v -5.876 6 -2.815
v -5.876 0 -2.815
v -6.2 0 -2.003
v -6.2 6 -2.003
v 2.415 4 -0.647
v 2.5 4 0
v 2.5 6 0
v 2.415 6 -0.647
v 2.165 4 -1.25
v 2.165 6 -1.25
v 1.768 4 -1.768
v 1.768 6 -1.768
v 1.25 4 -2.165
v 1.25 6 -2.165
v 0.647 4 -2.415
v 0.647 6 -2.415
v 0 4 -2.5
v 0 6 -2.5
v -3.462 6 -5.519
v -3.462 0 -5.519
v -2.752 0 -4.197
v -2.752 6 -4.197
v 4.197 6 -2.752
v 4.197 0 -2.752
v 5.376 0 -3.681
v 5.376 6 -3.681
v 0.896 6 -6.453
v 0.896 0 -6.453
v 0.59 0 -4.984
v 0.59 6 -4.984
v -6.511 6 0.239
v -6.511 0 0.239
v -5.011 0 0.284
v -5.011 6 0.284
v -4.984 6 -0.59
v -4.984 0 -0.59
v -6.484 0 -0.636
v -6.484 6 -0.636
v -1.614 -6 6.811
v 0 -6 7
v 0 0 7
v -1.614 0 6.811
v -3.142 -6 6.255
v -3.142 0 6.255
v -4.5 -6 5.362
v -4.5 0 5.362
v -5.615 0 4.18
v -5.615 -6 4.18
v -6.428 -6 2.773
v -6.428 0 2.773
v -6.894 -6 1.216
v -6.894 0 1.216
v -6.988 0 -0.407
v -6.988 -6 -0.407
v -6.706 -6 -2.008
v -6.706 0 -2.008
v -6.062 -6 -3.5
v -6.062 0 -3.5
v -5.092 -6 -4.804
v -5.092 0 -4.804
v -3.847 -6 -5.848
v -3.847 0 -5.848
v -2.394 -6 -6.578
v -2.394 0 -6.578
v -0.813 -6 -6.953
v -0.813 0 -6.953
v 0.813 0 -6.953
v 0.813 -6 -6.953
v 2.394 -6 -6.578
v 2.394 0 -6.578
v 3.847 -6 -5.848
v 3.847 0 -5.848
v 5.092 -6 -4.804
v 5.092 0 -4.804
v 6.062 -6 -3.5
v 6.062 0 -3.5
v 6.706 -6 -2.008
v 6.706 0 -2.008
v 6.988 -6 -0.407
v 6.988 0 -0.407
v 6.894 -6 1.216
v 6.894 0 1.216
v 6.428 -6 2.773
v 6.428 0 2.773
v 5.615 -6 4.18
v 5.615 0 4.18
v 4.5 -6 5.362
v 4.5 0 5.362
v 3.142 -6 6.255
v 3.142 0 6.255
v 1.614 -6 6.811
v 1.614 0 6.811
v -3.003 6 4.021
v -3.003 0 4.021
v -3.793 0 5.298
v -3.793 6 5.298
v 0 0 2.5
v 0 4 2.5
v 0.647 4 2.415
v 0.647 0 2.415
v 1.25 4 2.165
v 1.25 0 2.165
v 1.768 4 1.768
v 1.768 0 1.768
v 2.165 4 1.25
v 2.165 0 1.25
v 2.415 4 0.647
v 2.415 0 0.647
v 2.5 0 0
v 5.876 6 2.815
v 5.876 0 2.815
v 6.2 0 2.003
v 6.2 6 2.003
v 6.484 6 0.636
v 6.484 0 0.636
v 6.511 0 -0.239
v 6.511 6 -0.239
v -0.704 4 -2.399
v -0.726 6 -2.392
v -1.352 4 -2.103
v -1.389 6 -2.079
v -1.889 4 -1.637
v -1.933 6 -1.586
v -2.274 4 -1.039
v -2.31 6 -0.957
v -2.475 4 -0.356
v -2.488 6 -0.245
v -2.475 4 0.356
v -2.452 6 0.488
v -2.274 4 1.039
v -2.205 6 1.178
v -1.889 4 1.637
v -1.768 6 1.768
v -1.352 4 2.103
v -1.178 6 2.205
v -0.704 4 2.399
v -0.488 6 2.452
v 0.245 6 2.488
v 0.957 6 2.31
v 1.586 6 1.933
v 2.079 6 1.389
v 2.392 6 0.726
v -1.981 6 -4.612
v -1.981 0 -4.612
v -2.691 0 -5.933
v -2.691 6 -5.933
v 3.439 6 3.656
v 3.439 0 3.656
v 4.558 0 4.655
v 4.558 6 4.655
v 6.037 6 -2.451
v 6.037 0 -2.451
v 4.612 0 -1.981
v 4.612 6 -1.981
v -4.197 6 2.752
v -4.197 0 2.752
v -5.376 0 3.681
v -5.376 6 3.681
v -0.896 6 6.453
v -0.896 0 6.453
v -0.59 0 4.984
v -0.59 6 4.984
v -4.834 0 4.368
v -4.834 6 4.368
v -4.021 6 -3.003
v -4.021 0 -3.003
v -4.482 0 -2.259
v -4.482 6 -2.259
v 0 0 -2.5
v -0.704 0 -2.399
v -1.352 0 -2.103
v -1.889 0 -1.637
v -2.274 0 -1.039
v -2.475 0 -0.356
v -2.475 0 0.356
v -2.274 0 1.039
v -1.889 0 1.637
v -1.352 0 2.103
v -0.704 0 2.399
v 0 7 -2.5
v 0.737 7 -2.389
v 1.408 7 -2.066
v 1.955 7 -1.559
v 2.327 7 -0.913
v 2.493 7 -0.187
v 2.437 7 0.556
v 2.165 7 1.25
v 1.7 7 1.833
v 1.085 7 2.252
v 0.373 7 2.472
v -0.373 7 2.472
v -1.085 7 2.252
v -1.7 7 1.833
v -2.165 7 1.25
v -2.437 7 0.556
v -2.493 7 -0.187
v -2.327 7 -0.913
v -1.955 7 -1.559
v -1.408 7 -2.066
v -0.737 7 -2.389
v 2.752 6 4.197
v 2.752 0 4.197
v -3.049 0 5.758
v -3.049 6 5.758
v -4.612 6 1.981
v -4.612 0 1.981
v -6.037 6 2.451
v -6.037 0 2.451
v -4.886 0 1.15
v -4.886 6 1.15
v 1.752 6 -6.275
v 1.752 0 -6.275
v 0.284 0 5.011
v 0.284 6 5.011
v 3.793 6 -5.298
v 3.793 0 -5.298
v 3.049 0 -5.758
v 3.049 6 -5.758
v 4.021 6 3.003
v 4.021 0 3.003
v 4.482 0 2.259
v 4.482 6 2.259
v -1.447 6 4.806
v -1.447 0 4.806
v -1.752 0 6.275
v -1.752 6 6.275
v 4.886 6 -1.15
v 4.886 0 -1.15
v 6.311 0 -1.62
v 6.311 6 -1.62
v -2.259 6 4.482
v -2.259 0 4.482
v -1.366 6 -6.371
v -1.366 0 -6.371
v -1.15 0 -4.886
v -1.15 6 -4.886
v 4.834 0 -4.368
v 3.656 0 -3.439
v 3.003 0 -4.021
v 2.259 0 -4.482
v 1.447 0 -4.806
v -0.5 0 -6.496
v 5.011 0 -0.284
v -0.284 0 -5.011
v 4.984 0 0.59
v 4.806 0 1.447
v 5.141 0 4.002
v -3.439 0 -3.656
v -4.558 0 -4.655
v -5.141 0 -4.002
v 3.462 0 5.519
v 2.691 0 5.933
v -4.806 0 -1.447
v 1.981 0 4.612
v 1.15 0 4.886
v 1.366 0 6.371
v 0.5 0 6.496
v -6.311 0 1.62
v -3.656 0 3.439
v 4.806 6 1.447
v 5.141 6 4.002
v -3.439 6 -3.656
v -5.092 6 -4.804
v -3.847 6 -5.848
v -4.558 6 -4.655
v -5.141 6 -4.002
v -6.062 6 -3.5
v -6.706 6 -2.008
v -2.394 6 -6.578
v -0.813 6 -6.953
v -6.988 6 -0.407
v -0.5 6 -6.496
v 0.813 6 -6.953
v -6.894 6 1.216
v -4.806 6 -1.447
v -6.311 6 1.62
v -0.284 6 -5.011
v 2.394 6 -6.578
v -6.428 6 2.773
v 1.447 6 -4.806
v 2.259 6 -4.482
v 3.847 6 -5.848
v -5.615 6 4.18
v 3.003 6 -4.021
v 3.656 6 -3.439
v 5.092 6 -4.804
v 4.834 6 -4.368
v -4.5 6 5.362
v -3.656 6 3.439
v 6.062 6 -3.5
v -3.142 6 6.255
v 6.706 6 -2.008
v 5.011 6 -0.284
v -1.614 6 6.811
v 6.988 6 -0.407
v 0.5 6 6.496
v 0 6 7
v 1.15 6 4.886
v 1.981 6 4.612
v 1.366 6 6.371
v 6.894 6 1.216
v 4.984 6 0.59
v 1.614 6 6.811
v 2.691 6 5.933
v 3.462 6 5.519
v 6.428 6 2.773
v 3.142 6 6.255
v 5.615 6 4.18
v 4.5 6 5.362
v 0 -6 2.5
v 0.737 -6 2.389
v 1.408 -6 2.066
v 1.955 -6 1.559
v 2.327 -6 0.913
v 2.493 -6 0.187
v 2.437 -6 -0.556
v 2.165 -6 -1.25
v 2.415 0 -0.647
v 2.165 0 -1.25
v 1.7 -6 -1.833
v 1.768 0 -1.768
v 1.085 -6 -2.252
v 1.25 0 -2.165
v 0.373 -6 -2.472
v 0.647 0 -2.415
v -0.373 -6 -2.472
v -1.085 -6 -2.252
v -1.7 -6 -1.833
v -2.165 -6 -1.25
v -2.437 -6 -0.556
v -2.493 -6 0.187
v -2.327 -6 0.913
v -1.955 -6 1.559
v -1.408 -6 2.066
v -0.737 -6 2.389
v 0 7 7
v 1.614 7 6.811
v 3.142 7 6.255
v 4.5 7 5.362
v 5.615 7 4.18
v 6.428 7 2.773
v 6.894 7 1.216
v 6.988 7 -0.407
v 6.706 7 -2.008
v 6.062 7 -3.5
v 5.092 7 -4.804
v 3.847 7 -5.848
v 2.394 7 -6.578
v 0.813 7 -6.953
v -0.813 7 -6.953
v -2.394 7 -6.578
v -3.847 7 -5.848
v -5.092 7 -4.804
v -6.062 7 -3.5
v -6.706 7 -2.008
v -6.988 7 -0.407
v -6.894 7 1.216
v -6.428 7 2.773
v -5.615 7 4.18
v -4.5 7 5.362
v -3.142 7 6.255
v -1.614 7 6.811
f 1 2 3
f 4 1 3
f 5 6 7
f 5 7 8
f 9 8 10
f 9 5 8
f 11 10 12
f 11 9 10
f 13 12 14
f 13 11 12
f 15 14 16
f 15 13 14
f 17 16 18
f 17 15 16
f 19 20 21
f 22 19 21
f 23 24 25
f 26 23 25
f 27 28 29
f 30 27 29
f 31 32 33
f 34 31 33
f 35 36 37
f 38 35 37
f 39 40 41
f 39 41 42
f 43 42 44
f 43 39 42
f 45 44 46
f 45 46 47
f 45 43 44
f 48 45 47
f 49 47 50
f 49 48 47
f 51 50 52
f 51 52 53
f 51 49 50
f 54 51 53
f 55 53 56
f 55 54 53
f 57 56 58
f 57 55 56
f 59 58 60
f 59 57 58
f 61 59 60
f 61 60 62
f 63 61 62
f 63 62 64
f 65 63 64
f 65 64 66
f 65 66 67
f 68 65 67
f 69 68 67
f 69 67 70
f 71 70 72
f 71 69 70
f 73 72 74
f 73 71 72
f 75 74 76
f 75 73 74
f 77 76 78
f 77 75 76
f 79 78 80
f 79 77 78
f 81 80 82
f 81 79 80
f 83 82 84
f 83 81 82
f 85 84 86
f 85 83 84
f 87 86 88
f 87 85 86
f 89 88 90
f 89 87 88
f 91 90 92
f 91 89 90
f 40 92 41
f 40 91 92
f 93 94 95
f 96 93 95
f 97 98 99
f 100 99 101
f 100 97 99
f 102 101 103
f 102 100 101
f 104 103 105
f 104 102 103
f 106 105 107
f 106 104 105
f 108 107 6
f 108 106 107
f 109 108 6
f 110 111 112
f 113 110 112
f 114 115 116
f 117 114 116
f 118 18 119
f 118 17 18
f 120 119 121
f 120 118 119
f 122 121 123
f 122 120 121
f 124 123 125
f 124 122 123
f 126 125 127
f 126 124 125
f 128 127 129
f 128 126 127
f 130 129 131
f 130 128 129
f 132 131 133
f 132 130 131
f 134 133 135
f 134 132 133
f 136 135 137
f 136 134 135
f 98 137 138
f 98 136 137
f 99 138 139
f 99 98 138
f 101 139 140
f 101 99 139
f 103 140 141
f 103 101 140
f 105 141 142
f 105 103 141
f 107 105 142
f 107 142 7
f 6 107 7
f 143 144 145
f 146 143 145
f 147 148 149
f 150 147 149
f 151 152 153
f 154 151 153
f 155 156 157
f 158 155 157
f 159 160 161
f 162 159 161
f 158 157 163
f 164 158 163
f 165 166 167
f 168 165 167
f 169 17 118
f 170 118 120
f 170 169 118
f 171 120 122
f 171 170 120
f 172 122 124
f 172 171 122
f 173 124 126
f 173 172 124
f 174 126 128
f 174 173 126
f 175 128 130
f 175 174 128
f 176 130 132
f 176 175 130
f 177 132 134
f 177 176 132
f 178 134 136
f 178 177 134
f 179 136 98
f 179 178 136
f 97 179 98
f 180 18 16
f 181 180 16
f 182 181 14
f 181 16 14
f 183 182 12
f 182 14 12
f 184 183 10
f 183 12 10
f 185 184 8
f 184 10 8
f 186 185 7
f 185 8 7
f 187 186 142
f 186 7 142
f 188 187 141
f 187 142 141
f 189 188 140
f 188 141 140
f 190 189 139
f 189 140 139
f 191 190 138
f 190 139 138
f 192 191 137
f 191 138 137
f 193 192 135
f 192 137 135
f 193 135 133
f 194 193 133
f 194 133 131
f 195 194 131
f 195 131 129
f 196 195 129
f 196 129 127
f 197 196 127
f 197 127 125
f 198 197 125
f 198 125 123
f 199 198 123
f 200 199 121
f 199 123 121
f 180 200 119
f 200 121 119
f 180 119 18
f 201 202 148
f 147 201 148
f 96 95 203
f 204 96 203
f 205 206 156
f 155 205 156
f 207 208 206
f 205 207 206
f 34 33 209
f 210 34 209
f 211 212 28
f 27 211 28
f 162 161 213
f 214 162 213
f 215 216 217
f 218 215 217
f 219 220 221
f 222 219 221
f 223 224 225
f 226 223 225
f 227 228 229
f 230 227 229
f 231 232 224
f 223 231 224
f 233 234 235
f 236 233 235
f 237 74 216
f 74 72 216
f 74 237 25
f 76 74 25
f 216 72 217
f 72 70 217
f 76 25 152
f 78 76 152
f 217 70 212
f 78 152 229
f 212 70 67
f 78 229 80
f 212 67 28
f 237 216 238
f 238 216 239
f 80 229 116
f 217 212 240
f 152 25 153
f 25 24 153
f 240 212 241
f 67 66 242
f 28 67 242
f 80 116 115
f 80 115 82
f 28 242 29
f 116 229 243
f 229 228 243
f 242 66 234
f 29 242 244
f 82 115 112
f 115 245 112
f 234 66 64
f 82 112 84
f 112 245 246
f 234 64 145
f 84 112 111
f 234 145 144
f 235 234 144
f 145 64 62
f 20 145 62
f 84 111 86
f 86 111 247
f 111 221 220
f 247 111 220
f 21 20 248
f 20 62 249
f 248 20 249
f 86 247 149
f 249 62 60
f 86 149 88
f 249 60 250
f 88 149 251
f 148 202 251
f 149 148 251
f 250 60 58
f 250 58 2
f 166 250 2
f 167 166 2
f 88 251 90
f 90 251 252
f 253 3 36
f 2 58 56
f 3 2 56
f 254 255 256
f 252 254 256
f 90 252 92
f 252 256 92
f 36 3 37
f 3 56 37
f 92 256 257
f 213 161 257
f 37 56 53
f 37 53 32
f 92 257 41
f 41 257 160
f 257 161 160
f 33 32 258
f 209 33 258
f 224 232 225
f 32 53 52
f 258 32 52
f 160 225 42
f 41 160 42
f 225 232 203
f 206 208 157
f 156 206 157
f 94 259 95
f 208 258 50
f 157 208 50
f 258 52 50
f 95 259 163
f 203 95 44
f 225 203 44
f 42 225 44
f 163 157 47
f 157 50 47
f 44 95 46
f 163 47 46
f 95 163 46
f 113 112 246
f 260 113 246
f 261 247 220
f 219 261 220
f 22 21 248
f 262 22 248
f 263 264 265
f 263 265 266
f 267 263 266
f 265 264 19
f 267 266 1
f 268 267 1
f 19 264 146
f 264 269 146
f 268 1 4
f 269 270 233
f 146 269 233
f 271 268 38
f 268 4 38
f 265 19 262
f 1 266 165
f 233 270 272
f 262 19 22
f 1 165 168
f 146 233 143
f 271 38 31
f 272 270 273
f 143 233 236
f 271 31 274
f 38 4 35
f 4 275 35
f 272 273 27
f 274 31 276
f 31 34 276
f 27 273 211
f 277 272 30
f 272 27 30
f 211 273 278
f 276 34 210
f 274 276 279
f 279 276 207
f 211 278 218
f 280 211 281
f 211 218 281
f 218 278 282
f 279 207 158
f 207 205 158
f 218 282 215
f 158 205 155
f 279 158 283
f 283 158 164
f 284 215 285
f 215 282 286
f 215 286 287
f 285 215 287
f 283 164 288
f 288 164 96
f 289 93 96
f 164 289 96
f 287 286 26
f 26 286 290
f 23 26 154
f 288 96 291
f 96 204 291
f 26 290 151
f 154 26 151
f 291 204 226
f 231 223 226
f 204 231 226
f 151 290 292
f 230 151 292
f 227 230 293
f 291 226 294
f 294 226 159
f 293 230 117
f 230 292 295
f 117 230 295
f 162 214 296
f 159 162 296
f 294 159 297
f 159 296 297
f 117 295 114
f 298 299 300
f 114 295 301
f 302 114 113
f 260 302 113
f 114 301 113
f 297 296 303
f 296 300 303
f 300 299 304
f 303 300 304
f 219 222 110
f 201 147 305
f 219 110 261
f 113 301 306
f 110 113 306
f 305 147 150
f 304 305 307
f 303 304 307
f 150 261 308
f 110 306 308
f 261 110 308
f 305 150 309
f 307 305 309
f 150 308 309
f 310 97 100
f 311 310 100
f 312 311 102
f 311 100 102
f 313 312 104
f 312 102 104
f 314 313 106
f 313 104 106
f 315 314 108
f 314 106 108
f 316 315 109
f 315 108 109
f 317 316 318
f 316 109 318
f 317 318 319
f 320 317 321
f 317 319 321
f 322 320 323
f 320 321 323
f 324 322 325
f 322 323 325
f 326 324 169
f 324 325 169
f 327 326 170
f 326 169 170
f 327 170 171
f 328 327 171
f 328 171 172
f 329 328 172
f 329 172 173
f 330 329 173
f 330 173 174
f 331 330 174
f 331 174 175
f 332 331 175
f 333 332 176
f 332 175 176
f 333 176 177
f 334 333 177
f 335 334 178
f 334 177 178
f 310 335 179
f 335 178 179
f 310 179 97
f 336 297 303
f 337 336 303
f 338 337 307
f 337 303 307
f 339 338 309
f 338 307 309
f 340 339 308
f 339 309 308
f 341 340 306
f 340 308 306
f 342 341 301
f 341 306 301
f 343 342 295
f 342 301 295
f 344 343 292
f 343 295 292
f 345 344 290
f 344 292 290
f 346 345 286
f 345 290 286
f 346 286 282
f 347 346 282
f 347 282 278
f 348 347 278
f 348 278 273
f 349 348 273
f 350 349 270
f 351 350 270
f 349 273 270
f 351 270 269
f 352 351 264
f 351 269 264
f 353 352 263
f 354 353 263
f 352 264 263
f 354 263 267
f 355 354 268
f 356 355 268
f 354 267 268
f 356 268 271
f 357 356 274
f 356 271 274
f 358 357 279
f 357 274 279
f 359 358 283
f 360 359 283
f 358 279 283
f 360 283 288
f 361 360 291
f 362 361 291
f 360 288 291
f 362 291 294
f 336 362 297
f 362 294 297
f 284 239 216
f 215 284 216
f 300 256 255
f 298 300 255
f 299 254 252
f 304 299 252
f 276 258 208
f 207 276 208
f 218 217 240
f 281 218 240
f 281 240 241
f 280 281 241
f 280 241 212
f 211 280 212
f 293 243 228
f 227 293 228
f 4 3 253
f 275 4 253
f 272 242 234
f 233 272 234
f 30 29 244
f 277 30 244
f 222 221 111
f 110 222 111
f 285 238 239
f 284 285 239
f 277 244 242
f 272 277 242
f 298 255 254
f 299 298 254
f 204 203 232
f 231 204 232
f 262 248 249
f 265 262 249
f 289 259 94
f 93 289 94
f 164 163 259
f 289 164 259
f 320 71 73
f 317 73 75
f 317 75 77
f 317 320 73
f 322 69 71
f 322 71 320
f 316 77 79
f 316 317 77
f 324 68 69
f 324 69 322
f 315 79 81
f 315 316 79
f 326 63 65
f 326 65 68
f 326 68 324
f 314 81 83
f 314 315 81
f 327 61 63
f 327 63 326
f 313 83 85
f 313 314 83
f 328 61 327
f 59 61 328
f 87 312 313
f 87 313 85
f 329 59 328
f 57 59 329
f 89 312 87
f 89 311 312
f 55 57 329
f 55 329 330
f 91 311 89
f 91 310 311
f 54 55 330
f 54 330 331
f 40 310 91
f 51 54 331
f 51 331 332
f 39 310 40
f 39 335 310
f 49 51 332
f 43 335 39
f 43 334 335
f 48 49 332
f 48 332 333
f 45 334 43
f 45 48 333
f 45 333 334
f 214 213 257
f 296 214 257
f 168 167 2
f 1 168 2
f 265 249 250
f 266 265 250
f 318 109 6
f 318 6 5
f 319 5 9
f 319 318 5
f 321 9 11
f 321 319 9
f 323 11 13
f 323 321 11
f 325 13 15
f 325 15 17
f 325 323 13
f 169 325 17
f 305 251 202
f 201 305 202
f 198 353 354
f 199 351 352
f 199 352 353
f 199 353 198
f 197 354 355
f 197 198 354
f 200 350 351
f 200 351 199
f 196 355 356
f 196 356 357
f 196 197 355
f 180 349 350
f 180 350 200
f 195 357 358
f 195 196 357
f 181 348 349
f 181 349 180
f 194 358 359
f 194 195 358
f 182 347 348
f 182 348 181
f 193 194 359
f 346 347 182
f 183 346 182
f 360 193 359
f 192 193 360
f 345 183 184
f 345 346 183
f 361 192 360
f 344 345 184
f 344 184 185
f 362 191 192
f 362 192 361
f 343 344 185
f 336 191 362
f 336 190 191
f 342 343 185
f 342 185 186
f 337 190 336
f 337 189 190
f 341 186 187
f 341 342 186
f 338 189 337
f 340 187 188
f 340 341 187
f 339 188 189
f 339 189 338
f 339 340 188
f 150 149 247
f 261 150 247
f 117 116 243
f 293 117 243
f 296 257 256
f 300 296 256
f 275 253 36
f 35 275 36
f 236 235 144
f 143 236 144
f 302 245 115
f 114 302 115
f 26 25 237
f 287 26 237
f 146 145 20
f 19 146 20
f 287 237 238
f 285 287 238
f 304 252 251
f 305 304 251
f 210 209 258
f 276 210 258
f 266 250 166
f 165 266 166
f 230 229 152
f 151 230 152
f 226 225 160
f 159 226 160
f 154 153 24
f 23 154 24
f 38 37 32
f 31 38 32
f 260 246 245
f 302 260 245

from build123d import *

# Parameters (mm, degrees)
ESTRUSIONE_ESTRUSIONE1_OUTLINE_R = 2.5
ESTRUSIONE_ESTRUSIONE1_DEPTH     = 6
SCHIZZO2_R                       = 7
ESTRUSIONE_ESTRUSIONE2_DEPTH     = 1
FORI_FILETTATI_5_0MM1_D          = 5
ESTRUSIONE_ESTRUSIONE3_START     = 6
SCHIZZO4_R                       = 7
ESTRUSIONE_ESTRUSIONE3_DEPTH     = 6
FORI_FILETTATI_5_0MM2_D          = 5
FORI_FILETTATI_5_0MM2_DEPTH      = 10
FORI_FILETTATI_5_0MM2_TIP        = 1.502151548


# Read off the part's stored shape, not the designer's step: Estrusione-Estrusione1
with BuildPart() as part:
    # Estrusione-Estrusione1 outline → Estrusione-Estrusione1 (new body)
    with BuildSketch(Plane(origin=(0, 0, 0), x_dir=(1, 0, 0), z_dir=(0, 1, 0))):
        Polygon((-4.558413324, 4.655107649), (-5.141001385, 4.002407278), (-4.021493725, 3.00315582), (-4.481890734, 2.259206078), (-5.875647949, 2.815301129), (-6.199864976, 2.002706553), (-4.806107761, 1.446611503), (-4.984293637, 0.590062369), (-6.484192715, 0.635927742), (-6.51093335, -0.238550138), (-5.011034272, -0.284415511), (-4.885517166, -1.15025157), (-6.310648144, -1.620147915), (-6.036687071, -2.451034162), (-4.611556094, -1.981137817), (-4.197475223, -2.751828193), (-5.375946271, -3.680809823), (-4.83432724, -4.367887293), (-3.655856192, -3.438905663), (-3.00315582, -4.021493725), (-3.792825937, -5.297511743), (-3.048876196, -5.757908753), (-2.259206078, -4.481890734), (-1.446611503, -4.806107761), (-1.75223482, -6.275255564), (-0.895685686, -6.45344144), (-0.590062369, -4.984293637), (0.284415511, -5.011034272), (0.499701678, -6.496110952), (1.365537736, -6.370593846), (1.15025157, -4.885517166), (1.981137817, -4.611556094), (2.691366778, -5.933439486), (3.462057155, -5.519358615), (2.751828193, -4.197475223), (3.438905663, -3.655856192), (4.558413324, -4.655107649), (5.141001385, -4.002407278), (4.021493725, -3.00315582), (4.481890734, -2.259206078), (5.875647949, -2.815301129), (6.199864976, -2.002706553), (4.806107761, -1.446611503), (4.984293637, -0.590062369), (6.484192715, -0.635927742), (6.51093335, 0.238550138), (5.011034272, 0.284415511), (4.885517166, 1.15025157), (6.310648144, 1.620147915), (6.036687071, 2.451034162), (4.611556094, 1.981137817), (4.197475223, 2.751828193), (5.375946271, 3.680809823), (4.83432724, 4.367887293), (3.655856192, 3.438905663), (3.00315582, 4.021493725), (3.792825937, 5.297511743), (3.048876196, 5.757908753), (2.259206078, 4.481890734), (1.446611503, 4.806107761), (1.75223482, 6.275255564), (0.895685686, 6.45344144), (0.590062369, 4.984293637), (-0.284415511, 5.011034272), (-0.499701678, 6.496110952), (-1.365537736, 6.370593846), (-1.15025157, 4.885517166), (-1.981137817, 4.611556094), (-2.691366778, 5.933439486), (-3.462057155, 5.519358615), (-2.751828193, 4.197475223), (-3.438905663, 3.655856192), align=None)
        Circle(ESTRUSIONE_ESTRUSIONE1_OUTLINE_R, mode=Mode.SUBTRACT)
    extrude(amount=ESTRUSIONE_ESTRUSIONE1_DEPTH)

    # Schizzo2 → Estrusione-Estrusione2 (add)
    with BuildSketch(Plane(origin=(0, 6, 0), x_dir=(1, 0, 0), z_dir=(0, 1, 0))):
        with Locations(Location((0, 0, 0), (0, 0, 270))):
            Circle(SCHIZZO2_R)
    extrude(amount=ESTRUSIONE_ESTRUSIONE2_DEPTH)

    # Fori filettati Ø5.0mm1 (through all)
    with Locations(Plane.ZX.offset(7)):
        with Locations((0, 0)):
            Hole(FORI_FILETTATI_5_0MM1_D / 2)

    # Schizzo4 → Estrusione-Estrusione3 (add)
    with BuildSketch(Plane.XZ.offset(ESTRUSIONE_ESTRUSIONE3_START)):
        with Locations(Location((0, 0, 0), (0, 0, 90))):
            Circle(SCHIZZO4_R)
    extrude(amount=-ESTRUSIONE_ESTRUSIONE3_DEPTH)

    # Fori filettati Ø5.0mm2
    with Locations(Plane(origin=(0, -6, 0), x_dir=(0, 0, -1), z_dir=(0, -1, 0))):
        with Locations((0, 0)):
            Hole(FORI_FILETTATI_5_0MM2_D / 2, depth=FORI_FILETTATI_5_0MM2_DEPTH)
            with Locations((0, 0, -(FORI_FILETTATI_5_0MM2_DEPTH + FORI_FILETTATI_5_0MM2_TIP / 2))):  # 118° drill point
                Cone(0, FORI_FILETTATI_5_0MM2_D / 2, FORI_FILETTATI_5_0MM2_TIP, mode=Mode.SUBTRACT)


solid = part.part
